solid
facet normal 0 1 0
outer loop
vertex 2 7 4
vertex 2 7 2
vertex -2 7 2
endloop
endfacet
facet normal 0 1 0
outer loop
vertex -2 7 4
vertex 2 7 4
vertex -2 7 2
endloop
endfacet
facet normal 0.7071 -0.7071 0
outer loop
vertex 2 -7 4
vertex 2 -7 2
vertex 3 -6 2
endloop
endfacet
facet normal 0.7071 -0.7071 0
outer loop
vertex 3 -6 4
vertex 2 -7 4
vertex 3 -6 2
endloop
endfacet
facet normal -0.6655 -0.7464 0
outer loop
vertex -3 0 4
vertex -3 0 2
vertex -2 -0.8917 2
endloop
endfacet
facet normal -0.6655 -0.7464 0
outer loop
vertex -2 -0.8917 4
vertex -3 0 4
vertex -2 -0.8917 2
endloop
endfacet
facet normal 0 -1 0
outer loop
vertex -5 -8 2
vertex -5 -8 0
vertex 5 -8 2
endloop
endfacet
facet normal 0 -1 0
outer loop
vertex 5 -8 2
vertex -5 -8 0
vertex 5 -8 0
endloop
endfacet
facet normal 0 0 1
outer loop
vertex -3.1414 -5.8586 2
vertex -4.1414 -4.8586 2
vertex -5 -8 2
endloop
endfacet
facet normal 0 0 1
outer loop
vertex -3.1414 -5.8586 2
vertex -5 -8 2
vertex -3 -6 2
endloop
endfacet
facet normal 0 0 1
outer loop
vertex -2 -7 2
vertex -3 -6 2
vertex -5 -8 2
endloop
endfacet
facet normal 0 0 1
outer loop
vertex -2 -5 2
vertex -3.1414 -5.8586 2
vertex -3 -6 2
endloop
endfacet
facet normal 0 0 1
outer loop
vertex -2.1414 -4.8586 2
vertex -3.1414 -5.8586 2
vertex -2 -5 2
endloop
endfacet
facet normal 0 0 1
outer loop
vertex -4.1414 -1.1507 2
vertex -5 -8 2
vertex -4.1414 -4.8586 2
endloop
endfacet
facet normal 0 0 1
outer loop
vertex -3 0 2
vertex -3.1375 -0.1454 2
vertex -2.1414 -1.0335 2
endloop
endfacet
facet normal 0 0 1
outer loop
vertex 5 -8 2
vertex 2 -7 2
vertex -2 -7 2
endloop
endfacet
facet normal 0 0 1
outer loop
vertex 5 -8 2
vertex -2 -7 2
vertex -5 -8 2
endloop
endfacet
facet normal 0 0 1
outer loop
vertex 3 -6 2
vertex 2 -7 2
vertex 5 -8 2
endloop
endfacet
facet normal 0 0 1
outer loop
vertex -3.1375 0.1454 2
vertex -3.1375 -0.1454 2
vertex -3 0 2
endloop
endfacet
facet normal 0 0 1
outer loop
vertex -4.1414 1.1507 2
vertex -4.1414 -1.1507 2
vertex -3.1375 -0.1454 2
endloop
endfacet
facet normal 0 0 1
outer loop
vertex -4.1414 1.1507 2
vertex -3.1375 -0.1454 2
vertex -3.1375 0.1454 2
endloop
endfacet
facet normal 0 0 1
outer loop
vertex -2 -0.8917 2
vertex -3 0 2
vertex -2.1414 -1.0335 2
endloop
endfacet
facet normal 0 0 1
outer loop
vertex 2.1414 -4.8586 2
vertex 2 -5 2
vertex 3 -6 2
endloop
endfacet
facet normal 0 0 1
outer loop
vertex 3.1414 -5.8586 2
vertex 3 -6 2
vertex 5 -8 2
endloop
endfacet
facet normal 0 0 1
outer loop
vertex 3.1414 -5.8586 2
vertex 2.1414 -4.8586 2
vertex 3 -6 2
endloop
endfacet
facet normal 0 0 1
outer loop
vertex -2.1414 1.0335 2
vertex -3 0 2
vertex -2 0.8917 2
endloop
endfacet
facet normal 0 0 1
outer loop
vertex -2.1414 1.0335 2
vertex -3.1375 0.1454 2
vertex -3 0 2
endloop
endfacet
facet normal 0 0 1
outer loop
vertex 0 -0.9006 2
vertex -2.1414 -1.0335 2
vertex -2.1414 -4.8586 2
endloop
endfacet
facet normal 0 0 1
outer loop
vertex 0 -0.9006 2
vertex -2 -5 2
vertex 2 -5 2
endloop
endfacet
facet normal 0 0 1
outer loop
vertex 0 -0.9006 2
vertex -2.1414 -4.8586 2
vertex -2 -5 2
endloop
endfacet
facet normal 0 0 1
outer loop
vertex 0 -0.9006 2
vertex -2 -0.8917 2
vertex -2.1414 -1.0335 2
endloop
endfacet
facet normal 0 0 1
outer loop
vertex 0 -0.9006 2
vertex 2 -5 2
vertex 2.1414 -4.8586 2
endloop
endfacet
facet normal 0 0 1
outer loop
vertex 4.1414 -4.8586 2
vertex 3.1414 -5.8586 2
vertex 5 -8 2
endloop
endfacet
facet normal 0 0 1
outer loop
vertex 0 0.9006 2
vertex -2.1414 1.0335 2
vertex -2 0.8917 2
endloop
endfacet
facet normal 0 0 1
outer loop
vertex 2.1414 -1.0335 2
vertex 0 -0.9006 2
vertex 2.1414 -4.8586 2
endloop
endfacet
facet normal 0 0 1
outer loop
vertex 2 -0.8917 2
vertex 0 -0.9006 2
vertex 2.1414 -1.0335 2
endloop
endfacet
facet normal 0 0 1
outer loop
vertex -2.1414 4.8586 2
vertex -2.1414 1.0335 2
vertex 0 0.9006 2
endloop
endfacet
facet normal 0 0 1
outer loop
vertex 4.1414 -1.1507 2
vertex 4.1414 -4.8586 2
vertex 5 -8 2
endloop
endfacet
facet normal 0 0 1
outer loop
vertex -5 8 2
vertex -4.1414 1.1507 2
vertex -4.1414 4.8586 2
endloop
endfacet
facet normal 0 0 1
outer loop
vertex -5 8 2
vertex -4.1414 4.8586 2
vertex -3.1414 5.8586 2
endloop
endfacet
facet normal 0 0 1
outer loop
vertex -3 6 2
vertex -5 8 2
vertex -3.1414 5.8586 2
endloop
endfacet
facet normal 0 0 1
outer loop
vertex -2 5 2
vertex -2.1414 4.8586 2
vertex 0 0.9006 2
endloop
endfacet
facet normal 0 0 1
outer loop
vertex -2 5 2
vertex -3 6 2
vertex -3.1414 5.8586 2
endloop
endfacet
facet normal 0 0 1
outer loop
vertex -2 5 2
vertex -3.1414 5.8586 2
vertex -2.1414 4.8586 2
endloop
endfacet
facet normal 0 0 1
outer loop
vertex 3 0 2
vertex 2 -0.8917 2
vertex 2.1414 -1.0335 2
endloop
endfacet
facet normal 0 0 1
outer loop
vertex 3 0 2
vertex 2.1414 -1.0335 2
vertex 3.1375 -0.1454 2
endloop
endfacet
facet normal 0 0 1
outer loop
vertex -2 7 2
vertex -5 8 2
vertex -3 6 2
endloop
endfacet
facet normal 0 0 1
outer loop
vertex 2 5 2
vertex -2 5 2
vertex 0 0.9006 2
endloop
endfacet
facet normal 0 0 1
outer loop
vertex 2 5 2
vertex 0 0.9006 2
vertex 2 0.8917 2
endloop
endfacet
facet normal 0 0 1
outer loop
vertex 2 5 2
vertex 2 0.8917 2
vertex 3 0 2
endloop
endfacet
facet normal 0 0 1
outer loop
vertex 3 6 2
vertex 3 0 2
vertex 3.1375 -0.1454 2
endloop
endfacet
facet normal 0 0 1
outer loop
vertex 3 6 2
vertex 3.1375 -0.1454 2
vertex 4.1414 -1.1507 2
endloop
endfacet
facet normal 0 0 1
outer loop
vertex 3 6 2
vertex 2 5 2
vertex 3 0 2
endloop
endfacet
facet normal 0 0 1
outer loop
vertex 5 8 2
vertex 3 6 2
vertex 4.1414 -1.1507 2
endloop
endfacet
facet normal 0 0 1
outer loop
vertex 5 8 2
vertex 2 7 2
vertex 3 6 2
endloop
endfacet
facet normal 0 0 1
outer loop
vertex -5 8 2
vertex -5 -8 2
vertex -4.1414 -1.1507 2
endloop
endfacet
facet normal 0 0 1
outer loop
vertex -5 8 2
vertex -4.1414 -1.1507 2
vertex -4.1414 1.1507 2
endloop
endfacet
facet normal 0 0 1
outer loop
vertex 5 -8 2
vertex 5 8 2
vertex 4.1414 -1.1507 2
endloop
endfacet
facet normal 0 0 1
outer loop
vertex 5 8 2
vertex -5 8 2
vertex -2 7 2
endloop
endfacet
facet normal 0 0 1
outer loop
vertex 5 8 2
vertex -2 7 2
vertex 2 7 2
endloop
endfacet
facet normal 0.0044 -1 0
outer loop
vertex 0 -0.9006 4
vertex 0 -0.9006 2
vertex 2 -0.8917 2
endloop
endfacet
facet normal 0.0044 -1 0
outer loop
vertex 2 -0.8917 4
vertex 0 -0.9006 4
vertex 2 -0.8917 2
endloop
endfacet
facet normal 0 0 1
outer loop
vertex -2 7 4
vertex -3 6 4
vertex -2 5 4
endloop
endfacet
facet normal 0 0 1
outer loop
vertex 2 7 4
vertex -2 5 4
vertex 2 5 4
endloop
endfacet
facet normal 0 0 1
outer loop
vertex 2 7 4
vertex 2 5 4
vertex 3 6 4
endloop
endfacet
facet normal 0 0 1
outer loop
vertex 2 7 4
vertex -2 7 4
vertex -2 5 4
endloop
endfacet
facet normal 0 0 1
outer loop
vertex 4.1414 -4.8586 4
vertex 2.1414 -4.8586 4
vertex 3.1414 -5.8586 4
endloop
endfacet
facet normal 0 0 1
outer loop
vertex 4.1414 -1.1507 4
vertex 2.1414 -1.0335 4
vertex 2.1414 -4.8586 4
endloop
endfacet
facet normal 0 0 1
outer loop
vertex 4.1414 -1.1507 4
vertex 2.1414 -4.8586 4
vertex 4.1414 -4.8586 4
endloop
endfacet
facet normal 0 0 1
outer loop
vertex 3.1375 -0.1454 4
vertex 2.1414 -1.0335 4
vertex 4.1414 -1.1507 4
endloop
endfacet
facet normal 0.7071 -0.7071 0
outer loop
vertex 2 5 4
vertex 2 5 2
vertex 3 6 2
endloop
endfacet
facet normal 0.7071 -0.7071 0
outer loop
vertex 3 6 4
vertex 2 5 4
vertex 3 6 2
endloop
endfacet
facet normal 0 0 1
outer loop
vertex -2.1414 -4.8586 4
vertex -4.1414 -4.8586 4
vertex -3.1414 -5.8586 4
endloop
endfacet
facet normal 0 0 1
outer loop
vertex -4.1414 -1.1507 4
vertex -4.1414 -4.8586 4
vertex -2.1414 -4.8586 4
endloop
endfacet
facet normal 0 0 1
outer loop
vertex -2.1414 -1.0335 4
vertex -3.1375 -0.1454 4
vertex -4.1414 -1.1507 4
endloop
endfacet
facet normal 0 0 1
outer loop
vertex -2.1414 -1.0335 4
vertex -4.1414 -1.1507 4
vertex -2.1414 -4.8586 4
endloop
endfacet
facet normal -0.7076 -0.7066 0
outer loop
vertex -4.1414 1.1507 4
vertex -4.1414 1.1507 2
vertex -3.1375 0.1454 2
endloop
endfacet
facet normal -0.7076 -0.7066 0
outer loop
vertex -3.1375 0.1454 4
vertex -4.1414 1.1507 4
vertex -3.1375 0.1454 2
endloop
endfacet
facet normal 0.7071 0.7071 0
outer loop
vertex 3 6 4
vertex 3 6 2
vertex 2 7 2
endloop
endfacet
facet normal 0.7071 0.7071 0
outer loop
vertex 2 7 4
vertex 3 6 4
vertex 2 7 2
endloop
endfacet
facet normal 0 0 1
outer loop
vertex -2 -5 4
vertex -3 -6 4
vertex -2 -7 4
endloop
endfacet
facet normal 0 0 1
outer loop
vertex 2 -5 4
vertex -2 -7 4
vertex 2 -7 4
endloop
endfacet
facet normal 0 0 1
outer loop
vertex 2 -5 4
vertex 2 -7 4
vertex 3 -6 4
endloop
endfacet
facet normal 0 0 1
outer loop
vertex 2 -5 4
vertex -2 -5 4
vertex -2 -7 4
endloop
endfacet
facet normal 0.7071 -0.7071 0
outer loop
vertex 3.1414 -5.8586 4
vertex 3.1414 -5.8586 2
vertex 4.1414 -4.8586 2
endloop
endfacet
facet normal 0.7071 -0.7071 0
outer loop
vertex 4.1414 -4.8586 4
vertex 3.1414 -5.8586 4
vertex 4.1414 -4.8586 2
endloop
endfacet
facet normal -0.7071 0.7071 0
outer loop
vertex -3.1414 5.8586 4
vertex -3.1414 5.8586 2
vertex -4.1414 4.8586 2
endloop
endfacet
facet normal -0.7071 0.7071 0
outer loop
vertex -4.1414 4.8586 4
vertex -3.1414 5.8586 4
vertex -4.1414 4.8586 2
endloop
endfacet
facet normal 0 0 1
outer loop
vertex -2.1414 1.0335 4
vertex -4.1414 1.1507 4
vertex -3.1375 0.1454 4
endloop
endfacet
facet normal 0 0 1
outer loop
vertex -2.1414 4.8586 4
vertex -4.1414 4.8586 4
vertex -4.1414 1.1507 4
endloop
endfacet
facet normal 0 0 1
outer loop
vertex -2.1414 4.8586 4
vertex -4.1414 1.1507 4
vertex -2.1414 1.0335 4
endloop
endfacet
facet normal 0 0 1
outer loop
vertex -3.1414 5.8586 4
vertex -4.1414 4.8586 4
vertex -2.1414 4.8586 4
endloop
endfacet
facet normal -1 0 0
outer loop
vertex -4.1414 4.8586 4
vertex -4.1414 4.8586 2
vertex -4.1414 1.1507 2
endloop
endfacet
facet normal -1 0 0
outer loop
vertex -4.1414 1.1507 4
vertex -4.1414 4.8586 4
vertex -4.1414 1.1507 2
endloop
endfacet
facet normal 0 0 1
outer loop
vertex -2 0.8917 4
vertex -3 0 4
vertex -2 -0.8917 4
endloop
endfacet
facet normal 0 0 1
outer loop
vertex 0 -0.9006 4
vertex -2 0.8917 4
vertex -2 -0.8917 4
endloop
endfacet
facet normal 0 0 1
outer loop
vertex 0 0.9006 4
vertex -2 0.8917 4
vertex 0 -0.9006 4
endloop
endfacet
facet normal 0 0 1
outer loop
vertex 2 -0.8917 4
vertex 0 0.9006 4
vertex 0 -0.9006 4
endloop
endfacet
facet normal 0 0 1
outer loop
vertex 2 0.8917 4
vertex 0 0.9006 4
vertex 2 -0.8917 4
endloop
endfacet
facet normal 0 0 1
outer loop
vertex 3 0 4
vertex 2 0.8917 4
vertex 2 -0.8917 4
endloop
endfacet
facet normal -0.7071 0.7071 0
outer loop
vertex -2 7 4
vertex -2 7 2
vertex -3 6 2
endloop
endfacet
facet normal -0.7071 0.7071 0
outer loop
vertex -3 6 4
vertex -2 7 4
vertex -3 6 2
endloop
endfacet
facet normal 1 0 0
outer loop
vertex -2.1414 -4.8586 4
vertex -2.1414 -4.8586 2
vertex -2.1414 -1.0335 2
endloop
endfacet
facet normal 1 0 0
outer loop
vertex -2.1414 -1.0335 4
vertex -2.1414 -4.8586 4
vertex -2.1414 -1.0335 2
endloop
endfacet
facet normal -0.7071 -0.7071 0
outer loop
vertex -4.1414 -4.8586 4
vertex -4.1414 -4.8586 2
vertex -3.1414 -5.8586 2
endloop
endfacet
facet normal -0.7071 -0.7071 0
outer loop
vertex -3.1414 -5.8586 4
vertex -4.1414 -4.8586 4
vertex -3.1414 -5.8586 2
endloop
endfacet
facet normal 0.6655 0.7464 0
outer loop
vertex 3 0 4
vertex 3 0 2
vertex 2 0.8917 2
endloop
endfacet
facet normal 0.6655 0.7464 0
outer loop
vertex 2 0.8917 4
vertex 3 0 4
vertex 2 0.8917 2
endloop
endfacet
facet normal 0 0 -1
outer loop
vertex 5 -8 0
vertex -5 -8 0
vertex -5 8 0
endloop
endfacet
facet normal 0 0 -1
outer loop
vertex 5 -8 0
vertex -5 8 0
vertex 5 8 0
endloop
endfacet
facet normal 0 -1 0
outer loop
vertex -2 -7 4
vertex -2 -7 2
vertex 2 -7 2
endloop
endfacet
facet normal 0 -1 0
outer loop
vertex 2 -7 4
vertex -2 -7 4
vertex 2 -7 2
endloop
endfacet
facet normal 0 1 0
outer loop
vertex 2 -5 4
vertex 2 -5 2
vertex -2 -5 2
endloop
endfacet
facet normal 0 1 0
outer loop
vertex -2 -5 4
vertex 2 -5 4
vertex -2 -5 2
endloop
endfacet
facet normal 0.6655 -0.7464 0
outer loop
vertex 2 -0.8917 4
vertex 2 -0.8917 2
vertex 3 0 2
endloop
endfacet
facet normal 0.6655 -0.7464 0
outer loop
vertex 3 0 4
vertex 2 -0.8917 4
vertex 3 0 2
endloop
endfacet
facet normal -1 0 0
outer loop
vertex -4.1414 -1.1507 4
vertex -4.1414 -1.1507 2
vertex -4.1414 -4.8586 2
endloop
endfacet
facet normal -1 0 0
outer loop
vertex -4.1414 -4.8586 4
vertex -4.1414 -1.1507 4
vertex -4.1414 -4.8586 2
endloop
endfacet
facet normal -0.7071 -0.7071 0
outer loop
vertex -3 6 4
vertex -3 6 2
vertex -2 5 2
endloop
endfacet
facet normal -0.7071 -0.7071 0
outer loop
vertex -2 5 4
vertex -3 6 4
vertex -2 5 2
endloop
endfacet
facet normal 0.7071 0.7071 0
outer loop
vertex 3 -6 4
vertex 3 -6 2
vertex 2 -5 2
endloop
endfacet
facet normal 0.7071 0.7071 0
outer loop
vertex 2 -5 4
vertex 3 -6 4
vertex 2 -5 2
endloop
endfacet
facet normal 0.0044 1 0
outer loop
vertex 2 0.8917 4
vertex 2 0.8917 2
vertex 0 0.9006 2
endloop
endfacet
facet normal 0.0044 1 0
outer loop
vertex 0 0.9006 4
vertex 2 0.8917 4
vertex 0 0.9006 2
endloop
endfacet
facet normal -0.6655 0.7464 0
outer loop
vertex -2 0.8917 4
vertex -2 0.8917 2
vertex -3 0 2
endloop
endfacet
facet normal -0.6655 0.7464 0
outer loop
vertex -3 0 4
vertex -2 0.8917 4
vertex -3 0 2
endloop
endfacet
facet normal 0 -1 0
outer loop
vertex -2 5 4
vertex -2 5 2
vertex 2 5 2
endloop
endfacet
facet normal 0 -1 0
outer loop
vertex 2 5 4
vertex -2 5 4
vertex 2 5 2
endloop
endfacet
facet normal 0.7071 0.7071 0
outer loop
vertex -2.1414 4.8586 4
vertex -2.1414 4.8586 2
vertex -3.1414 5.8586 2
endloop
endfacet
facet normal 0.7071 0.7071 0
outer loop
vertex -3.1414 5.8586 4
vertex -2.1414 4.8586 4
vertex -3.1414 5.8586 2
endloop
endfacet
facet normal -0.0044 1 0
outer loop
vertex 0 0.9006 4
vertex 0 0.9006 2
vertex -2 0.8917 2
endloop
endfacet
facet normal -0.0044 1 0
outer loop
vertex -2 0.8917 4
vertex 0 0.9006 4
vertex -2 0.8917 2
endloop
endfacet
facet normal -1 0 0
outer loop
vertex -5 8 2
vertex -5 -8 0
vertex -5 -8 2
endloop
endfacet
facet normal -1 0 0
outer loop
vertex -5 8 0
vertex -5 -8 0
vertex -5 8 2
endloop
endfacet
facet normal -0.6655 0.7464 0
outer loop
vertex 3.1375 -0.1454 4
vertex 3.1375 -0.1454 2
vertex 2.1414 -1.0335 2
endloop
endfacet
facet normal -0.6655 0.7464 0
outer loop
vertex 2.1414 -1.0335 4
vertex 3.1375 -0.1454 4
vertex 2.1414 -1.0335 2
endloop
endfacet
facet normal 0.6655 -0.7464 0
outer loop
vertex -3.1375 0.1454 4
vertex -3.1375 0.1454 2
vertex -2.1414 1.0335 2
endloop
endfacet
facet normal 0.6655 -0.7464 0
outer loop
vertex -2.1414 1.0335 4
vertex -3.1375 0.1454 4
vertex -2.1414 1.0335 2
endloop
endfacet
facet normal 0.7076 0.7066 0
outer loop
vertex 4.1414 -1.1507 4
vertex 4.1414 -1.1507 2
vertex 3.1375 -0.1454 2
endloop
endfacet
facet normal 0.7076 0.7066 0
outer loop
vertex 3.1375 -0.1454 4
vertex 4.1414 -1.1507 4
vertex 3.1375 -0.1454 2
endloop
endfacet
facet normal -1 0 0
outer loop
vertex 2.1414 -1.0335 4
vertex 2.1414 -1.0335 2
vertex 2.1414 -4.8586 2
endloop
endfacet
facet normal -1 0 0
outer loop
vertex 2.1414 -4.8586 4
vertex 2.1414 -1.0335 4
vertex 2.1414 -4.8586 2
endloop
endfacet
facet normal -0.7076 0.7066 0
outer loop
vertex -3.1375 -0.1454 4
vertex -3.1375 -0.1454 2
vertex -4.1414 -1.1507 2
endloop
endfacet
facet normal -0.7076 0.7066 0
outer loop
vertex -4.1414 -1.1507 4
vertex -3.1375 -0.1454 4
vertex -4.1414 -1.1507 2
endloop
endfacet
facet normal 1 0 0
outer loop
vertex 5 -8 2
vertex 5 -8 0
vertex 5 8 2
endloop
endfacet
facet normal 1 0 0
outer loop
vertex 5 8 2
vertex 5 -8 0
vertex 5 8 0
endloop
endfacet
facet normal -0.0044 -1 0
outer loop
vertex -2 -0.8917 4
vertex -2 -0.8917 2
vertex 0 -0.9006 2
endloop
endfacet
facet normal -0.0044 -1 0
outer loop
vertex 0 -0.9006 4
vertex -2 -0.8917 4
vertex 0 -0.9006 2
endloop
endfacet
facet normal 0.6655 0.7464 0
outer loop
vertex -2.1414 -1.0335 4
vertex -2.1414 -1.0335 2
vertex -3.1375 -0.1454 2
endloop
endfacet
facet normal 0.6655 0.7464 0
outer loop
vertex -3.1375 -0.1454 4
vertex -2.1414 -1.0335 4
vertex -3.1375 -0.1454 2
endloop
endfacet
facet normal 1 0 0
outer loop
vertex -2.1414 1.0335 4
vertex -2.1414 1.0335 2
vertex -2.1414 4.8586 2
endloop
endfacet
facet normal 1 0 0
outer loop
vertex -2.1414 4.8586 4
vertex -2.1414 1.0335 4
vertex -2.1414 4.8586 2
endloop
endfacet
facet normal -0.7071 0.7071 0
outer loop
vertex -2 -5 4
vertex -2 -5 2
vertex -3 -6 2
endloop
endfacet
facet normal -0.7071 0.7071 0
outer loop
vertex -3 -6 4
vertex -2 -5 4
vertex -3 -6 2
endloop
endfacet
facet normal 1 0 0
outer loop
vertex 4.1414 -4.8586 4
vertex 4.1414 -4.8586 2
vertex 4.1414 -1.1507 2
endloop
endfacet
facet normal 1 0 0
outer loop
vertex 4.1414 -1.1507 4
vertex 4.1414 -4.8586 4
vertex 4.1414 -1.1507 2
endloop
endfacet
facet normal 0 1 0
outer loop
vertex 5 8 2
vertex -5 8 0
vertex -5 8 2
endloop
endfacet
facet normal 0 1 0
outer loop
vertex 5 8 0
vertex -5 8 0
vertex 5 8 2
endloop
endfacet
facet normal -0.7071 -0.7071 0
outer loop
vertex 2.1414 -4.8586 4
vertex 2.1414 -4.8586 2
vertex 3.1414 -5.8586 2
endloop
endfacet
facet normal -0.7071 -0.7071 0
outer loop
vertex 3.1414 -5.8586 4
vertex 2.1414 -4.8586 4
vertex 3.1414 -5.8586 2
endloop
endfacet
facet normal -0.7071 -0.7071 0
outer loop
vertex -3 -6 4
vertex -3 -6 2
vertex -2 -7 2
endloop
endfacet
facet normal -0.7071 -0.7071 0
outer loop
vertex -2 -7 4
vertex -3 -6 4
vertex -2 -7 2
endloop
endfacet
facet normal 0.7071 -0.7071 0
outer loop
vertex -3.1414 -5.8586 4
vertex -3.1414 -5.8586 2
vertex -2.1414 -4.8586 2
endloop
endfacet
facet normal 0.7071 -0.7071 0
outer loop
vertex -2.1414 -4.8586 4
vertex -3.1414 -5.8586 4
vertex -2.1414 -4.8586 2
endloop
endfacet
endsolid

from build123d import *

# Parameters (mm, degrees)
F0_W     = 10
F0_H     = 16
F1_DEPTH = 2
F3_DEPTH = 2


# Not quite as in the source:
# - ends of sketch curves that miss each other by under 0.0002 mm in the source are joined
# - a feature names something its author has since deleted; it is built from what else it names


with BuildPart() as f1:
    # F0 (on Top) → F1 (new body)
    with BuildSketch(Plane.XY):
        Rectangle(F0_W, F0_H)
    extrude(amount=F1_DEPTH)

    # F2 (on face) → F3 (join)
    with BuildSketch(Plane.XY.offset(2)):
        Polygon((0, 7), (-2, 7), (-3, 6), (-2, 5), (0, 5), (2, 5), (3, 6), (2, 7), align=None)
        Polygon((-2.1414213562, 4.8585786438), (-3.1414213562, 5.8585786438), (-4.1414213562, 4.8585786438), (-4.1414213562, 1.1507223826), (-3.1374518146, 0.1453992321), (-2.1414213562, 1.0335195075), align=None)
        Polygon((2, 0.891659756), (2.00782e-05, 0.9006214721), (-2, 0.891659756), (-3, 0), (-2, -0.891659756), (-2.00782e-05, -0.9006214721), (2, -0.891659756), (3, 0), align=None)
        Polygon((3.1374518146, -0.1453992321), (2.1414213562, -1.0335195075), (2.1414213562, -4.8585786438), (3.1414213562, -5.8585786438), (4.1414213562, -4.8585786438), (4.1414213562, -1.1507223826), align=None)
        Polygon((0, -5), (-2, -5), (-3, -6), (-2, -7), (0, -7), (2, -7), (3, -6), (2, -5), align=None)
        Polygon((-4.1414213562, -4.8585786438), (-3.1414213562, -5.8585786438), (-2.1414213562, -4.8585786438), (-2.1414213562, -1.0335195075), (-3.1374518146, -0.1453992321), (-4.1414213562, -1.1507223826), align=None)
    extrude(amount=F3_DEPTH)


solid = f1.part
